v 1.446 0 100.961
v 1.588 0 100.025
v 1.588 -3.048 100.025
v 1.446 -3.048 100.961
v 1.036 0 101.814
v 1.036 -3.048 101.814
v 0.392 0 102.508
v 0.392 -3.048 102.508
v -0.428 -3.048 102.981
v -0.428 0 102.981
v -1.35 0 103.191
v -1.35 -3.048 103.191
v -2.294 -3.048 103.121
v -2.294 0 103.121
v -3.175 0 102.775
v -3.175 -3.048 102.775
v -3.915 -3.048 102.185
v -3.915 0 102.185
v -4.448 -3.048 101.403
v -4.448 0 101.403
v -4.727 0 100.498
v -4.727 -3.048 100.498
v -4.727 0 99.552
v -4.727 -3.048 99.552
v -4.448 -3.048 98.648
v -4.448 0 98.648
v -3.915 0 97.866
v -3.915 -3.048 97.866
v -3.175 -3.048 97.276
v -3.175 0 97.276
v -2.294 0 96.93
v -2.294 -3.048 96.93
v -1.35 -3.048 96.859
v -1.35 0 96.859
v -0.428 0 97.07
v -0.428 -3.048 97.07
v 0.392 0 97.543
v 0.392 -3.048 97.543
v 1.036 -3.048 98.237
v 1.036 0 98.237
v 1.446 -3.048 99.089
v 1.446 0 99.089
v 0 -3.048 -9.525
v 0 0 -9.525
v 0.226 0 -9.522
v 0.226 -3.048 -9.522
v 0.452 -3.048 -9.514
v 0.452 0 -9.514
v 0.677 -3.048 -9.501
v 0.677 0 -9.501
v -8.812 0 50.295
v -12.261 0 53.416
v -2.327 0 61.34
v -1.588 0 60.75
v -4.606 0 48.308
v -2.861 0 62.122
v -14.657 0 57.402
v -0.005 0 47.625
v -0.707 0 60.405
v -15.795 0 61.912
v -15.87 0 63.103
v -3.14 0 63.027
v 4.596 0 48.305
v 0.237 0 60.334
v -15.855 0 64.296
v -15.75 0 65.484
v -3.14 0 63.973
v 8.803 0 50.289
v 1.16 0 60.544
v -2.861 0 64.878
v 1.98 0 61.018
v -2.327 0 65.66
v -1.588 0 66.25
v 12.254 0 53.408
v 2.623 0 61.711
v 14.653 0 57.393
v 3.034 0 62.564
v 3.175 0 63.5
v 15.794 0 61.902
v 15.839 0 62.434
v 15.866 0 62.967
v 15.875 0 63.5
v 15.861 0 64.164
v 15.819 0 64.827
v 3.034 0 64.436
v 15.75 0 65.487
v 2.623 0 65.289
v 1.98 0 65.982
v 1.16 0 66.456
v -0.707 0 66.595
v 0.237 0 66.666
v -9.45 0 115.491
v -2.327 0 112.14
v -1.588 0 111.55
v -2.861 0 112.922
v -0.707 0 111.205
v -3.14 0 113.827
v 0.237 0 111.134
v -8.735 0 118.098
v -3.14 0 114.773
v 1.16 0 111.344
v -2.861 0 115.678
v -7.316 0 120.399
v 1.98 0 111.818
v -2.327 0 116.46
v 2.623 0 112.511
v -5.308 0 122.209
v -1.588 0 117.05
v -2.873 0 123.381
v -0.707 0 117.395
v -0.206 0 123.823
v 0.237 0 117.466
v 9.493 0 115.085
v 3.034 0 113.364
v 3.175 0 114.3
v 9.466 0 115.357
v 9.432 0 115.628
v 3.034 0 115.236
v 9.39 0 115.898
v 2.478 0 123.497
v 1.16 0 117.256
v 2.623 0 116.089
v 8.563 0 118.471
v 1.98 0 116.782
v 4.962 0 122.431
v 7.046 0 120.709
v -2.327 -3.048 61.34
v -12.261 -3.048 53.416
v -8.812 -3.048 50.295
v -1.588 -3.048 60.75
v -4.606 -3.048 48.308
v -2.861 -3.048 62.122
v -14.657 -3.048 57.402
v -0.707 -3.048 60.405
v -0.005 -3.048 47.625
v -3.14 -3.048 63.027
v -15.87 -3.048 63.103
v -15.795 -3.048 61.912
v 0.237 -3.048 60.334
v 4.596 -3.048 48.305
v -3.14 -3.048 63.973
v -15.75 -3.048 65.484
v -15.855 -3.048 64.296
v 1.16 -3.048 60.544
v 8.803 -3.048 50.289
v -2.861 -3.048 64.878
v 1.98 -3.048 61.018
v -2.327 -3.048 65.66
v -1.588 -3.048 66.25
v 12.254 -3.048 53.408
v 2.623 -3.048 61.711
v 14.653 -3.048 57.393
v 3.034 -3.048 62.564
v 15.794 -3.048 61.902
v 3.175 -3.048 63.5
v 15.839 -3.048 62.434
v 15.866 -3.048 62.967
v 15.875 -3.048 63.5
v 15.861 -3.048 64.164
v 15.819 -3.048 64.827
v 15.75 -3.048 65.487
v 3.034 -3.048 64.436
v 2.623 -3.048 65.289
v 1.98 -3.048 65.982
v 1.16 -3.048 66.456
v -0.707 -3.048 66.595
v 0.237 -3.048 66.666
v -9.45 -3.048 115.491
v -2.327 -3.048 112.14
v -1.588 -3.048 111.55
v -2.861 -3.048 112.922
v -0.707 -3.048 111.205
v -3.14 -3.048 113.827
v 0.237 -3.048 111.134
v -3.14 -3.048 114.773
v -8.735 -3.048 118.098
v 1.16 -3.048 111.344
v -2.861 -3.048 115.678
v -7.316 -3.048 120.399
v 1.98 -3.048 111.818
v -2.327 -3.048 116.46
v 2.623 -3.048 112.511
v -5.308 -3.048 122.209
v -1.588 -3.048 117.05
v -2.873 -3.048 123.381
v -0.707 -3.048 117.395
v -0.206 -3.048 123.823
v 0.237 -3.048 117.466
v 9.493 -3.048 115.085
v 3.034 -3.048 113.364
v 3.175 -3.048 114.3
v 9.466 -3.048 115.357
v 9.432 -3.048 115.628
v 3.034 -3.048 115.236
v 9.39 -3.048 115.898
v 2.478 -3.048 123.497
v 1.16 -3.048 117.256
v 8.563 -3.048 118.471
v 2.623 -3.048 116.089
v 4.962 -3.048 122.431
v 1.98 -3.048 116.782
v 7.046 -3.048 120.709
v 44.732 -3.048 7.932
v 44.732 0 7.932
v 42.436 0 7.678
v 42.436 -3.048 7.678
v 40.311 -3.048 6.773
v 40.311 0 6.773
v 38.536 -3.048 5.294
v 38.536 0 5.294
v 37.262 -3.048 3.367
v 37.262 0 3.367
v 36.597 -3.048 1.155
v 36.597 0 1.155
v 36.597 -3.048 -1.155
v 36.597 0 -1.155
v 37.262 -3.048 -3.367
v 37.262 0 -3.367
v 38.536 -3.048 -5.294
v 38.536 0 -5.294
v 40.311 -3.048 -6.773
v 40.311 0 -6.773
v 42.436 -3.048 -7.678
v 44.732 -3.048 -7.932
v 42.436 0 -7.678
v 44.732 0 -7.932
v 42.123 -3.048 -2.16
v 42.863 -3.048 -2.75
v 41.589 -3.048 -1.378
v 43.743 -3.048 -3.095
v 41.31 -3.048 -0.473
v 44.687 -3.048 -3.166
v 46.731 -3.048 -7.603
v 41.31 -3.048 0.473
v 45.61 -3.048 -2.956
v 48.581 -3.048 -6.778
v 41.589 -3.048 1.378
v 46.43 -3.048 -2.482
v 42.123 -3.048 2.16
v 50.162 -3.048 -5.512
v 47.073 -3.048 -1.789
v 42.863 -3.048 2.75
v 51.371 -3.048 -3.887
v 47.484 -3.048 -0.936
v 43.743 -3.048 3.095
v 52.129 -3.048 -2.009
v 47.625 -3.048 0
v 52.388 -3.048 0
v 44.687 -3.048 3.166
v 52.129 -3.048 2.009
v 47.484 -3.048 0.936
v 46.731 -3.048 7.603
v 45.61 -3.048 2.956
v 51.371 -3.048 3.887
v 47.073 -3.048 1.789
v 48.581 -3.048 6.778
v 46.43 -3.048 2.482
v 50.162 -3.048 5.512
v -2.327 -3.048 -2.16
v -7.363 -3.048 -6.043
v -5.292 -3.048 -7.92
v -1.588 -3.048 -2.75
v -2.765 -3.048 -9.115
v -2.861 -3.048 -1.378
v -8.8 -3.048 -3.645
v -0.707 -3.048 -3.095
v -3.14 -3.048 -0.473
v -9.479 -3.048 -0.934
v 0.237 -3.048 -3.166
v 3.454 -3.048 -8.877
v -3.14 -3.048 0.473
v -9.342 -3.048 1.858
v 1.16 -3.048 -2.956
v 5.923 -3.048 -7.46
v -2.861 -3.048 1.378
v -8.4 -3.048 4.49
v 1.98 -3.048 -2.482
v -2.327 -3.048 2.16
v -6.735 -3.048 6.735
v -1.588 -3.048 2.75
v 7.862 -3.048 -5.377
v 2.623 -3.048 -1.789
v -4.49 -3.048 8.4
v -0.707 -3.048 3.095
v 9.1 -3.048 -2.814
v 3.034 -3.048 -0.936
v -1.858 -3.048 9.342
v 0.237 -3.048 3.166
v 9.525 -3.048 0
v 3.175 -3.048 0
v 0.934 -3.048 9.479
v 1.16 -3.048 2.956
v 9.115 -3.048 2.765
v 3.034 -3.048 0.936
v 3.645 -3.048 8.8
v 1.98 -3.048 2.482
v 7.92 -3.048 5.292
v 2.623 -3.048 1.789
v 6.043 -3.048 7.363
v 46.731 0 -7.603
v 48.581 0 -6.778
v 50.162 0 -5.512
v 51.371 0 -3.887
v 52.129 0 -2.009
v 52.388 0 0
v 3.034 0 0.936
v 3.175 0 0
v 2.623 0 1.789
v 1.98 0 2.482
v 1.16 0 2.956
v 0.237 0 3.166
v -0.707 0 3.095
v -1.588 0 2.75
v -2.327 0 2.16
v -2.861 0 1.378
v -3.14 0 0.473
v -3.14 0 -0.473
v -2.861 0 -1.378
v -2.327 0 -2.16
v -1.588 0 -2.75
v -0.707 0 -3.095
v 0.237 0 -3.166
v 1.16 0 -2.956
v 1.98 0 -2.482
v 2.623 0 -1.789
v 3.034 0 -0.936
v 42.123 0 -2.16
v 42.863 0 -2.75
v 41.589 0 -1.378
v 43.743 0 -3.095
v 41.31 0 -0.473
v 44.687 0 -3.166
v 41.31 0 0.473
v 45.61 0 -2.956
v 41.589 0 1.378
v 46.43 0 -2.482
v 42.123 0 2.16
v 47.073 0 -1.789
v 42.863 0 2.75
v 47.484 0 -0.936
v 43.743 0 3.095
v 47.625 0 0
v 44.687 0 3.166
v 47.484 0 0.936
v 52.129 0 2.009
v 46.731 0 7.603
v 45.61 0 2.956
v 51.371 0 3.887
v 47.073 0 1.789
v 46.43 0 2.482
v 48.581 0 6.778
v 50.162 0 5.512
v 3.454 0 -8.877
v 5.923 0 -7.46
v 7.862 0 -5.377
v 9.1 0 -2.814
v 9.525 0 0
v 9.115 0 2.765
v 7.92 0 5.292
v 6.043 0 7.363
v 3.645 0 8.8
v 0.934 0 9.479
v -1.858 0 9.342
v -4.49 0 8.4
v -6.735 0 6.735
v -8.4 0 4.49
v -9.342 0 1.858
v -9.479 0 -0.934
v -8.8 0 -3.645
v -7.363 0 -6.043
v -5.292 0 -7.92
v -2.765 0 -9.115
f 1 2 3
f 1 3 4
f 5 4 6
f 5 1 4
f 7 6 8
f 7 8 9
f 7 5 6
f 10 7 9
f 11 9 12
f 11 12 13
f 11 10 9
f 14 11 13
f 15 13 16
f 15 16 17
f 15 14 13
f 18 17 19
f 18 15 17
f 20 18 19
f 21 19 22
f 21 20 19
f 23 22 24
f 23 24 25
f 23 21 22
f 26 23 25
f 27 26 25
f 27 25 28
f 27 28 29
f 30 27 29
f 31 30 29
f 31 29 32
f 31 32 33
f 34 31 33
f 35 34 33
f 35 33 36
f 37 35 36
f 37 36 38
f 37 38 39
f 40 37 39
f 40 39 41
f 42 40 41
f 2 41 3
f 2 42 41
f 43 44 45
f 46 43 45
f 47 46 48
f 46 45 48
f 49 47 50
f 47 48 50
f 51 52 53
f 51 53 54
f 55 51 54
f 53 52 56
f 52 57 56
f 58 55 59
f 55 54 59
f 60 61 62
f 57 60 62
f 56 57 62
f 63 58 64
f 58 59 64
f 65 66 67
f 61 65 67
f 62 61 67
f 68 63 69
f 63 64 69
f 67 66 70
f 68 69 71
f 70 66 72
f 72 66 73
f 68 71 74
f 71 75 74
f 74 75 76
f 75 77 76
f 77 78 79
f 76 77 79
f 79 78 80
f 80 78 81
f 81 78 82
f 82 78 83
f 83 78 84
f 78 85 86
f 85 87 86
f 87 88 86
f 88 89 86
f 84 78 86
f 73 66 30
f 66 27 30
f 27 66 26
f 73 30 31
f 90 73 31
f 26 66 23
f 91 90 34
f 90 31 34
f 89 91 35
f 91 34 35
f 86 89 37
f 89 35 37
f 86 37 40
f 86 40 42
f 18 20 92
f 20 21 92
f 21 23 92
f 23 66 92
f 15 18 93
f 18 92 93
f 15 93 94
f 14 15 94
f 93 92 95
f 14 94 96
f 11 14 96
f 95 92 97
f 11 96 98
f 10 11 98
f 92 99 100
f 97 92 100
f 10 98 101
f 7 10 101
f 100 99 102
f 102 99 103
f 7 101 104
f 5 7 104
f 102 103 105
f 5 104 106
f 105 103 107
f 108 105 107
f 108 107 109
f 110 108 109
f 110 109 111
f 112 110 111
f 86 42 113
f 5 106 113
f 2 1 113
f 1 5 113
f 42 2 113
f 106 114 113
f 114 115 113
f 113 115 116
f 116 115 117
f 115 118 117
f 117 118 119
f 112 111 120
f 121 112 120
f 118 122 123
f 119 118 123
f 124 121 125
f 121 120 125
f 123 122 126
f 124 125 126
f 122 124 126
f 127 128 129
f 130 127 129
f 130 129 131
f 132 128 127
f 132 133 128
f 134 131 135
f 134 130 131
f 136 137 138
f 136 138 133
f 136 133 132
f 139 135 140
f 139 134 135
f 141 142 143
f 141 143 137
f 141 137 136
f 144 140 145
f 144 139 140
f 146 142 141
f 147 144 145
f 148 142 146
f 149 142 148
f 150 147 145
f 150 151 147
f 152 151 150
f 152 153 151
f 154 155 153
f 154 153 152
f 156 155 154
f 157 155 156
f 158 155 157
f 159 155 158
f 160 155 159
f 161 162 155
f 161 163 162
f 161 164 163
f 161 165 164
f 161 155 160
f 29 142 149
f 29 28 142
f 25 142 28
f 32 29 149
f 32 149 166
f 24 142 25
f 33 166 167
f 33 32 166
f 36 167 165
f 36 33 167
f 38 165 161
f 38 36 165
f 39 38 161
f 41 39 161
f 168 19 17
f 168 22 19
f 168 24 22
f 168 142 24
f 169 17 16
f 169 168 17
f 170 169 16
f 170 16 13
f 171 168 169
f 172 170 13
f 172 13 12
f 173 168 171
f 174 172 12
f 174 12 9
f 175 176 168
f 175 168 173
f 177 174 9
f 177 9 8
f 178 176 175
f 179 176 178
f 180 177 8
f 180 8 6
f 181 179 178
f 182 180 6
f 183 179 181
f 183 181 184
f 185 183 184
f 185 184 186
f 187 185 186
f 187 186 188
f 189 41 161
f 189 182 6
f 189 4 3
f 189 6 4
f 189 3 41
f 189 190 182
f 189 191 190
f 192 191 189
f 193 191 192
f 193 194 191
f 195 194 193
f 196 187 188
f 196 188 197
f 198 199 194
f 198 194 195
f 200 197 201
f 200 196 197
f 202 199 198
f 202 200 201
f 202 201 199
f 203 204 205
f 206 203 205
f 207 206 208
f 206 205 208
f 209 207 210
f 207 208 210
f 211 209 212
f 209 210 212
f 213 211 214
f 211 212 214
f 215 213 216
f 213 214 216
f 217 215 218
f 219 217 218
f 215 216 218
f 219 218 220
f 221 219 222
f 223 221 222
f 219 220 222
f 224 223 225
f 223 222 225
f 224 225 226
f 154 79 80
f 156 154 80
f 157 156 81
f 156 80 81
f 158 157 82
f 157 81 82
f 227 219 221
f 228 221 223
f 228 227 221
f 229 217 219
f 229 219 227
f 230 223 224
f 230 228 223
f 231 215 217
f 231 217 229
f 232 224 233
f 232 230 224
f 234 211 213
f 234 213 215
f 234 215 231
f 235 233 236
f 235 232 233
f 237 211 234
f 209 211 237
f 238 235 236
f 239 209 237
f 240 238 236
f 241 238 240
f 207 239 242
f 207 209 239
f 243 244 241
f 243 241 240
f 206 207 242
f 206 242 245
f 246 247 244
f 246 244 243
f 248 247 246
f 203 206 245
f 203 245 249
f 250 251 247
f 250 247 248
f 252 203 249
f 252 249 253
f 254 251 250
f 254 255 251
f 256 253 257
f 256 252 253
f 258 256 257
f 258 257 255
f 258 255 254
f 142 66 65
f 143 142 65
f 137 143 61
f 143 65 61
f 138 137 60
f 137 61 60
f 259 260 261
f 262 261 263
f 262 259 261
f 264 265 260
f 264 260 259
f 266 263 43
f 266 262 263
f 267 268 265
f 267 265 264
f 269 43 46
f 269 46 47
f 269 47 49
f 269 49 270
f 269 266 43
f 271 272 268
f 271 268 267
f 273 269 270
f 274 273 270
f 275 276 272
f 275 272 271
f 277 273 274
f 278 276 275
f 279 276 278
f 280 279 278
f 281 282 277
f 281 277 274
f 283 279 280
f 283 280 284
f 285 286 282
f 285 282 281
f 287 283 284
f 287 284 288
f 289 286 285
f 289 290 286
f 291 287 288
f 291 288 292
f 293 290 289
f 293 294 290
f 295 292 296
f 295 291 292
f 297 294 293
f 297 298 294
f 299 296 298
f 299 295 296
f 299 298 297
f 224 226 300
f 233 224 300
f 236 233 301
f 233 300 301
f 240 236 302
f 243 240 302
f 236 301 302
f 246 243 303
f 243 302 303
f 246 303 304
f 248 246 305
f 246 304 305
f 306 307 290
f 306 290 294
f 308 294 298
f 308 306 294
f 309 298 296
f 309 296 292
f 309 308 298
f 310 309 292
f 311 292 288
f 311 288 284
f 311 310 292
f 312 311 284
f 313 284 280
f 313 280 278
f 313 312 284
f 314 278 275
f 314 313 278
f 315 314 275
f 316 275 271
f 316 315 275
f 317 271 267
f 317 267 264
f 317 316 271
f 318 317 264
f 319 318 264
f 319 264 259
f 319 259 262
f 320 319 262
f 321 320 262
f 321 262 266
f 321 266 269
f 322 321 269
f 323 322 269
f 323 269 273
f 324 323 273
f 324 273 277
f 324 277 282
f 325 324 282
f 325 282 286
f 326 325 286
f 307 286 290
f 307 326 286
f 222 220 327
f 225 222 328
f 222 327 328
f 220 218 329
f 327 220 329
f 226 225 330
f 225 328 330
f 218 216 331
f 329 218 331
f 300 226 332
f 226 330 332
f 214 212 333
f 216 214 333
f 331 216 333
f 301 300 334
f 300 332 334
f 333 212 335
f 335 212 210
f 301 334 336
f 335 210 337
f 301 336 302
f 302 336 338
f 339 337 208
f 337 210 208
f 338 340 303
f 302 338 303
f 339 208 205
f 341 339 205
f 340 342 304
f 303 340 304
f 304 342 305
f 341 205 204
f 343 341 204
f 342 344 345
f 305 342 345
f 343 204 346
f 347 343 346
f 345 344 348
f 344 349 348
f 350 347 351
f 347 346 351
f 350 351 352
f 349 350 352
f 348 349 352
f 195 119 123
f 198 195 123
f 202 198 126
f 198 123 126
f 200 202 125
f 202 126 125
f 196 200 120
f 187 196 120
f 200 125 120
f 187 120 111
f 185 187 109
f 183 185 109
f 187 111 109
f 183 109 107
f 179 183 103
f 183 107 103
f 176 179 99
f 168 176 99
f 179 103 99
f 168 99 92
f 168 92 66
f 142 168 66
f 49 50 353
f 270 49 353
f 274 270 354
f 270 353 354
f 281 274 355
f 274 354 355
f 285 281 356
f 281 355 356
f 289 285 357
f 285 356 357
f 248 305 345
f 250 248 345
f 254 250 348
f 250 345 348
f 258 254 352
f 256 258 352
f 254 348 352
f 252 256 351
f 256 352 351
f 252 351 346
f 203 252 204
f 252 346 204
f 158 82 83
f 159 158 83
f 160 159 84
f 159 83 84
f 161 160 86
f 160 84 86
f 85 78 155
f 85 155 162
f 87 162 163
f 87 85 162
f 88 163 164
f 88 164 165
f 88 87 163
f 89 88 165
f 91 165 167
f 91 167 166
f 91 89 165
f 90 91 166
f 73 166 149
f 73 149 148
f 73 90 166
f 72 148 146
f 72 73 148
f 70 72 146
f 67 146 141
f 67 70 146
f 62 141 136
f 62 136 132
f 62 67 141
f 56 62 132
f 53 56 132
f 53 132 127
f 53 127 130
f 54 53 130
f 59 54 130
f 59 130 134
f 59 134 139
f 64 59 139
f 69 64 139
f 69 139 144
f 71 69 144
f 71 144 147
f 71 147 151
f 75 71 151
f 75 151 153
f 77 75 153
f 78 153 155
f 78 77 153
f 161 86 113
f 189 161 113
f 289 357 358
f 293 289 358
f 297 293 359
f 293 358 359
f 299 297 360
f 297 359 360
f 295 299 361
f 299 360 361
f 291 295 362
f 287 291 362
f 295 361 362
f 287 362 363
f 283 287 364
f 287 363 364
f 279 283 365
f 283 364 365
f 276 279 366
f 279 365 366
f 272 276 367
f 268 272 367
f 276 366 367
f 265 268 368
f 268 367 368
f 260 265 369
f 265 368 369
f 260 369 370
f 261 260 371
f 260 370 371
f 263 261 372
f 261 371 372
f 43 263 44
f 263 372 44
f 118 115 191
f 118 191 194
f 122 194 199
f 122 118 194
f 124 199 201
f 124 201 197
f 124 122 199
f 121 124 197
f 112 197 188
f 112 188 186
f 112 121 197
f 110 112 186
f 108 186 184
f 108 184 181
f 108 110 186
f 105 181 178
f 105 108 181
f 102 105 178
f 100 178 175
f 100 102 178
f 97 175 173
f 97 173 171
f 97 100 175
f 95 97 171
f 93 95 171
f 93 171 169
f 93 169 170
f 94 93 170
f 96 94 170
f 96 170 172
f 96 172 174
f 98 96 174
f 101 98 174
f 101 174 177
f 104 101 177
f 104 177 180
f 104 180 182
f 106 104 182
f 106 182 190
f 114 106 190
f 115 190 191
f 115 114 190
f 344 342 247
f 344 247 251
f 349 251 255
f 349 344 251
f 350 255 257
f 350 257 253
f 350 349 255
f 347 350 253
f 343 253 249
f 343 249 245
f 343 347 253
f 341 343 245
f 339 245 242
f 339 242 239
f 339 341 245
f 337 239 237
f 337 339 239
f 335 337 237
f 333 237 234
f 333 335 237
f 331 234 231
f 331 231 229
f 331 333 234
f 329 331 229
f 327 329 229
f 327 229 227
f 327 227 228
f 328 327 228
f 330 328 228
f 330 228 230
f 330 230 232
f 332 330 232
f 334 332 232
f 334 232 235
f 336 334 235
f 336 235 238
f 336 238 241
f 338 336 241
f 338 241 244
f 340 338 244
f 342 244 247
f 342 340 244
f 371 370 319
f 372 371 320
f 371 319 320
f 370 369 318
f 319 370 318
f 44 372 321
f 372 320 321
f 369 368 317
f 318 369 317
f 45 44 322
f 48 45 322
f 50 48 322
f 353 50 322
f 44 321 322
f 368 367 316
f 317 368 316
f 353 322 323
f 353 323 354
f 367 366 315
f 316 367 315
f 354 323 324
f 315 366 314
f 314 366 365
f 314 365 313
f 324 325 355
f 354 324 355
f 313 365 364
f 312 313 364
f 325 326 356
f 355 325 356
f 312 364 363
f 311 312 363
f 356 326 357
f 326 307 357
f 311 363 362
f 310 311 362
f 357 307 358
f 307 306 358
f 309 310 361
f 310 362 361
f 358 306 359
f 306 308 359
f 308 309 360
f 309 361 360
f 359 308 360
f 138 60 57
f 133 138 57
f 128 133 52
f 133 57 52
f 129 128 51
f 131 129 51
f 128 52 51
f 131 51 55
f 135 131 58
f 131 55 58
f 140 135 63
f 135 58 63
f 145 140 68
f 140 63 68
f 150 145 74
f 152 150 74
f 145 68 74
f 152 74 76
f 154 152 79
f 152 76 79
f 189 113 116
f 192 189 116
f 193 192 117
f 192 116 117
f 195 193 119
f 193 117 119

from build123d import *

# Parameters (mm, degrees)
F0_R     = 3.175
F1_DEPTH = 3.048


with BuildPart() as f1:
    # F0 (on Front) → F1 (new body)
    with BuildSketch(Plane.XZ):
        with BuildLine():
            ThreePointArc((9.4926232832, 115.0846835052), (9.4500845614, 115.4922779803), (9.3900527262, 115.8976654218))
            Line((9.3900527262, 115.8976654218), (9.4926232832, 115.0846835052))
        make_face()
        with BuildLine():
            ThreePointArc((15.7501409357, 65.4871299672), (-0.0013883883, 79.3749999393), (-15.7504882737, 65.484375))
            ThreePointArc((-15.7504882737, 65.484375), (-15.8737438155, 63.6997054867), (-15.7954255641, 61.9125))
            ThreePointArc((-15.7954255641, 61.9125), (-0.0051859112, 47.625000847), (15.7943850107, 61.9021805065))
            ThreePointArc((15.7943850107, 61.9021805065), (15.8548334435, 62.7000740799), (15.875, 63.5))
            ThreePointArc((15.875, 63.5), (15.8437544849, 64.495524396), (15.7501409357, 65.4871299672))
        make_face()
        with Locations((0, 63.5)):
            Circle(F0_R, mode=Mode.SUBTRACT)
        with BuildLine():
            Line((9.4926232832, 115.0846835052), (9.3900527262, 115.8976654218))
            ThreePointArc((9.3900527262, 115.8976654218), (-0.2057369627, 123.8227778144), (-9.4502929642, 115.490625))
            ThreePointArc((-9.4502929642, 115.490625), (-0.596483242, 104.7936951058), (9.525, 114.3))
            ThreePointArc((9.525, 114.3), (9.5169023787, 114.6926755834), (9.4926232832, 115.0846835052))
        make_face()
        with Locations((0, 114.3)):
            Circle(F0_R, mode=Mode.SUBTRACT)
        with BuildLine():
            ThreePointArc((9.525, 114.3), (-0.596483242, 104.7936951058), (-9.4502929642, 115.490625))
            Line((-9.4502929642, 115.490625), (-15.7504882737, 65.484375))
            ThreePointArc((-15.7504882737, 65.484375), (-0.0013883883, 79.3749999393), (15.7501409357, 65.4871299672))
            Line((15.7501409357, 65.4871299672), (9.4926232832, 115.0846835052))
            ThreePointArc((9.4926232832, 115.0846835052), (9.5169023787, 114.6926755834), (9.525, 114.3))
        make_face()
        with Locations((-1.5875, 100.0252)):
            Circle(F0_R, mode=Mode.SUBTRACT)
    extrude(amount=F1_DEPTH)


with BuildPart() as f1b:
    # F0 (on Front) → F1, piece 2 (new body)
    with BuildSketch(Plane.XZ):
        with BuildLine():
            ThreePointArc((0, -9.525), (0.3388863295, -9.5189695375), (0.6773435479, -9.500885786))
            Line((0.6773435479, -9.500885786), (0, -9.525))
        make_face()
        with BuildLine():
            Line((0, -9.525), (0.6773435479, -9.500885786))
            ThreePointArc((0.6773435479, -9.500885786), (6.9705567315, -6.4912990883), (9.525, 0))
            ThreePointArc((9.525, 0), (-6.7351920908, 6.7351920908), (0, -9.525))
        make_face()
        Circle(F0_R, mode=Mode.SUBTRACT)
    extrude(amount=F1_DEPTH)


with BuildPart() as f1c:
    # F0 (on Front) → F1, piece 3 (new body)
    with BuildSketch(Plane.XZ):
        with BuildLine():
            ThreePointArc((52.3875, 0), (50.1616327839, 5.5119104847), (44.7324052746, 7.9324746146))
            ThreePointArc((44.7324052746, 7.9324746146), (36.5125, 0), (44.7324052746, -7.9324746146))
            ThreePointArc((44.7324052746, -7.9324746146), (50.1616327839, -5.5119104847), (52.3875, 0))
        make_face()
        with Locations((44.45, 0)):
            Circle(F0_R, mode=Mode.SUBTRACT)
    extrude(amount=F1_DEPTH)


solid = Compound([f1.part, f1b.part, f1c.part])
